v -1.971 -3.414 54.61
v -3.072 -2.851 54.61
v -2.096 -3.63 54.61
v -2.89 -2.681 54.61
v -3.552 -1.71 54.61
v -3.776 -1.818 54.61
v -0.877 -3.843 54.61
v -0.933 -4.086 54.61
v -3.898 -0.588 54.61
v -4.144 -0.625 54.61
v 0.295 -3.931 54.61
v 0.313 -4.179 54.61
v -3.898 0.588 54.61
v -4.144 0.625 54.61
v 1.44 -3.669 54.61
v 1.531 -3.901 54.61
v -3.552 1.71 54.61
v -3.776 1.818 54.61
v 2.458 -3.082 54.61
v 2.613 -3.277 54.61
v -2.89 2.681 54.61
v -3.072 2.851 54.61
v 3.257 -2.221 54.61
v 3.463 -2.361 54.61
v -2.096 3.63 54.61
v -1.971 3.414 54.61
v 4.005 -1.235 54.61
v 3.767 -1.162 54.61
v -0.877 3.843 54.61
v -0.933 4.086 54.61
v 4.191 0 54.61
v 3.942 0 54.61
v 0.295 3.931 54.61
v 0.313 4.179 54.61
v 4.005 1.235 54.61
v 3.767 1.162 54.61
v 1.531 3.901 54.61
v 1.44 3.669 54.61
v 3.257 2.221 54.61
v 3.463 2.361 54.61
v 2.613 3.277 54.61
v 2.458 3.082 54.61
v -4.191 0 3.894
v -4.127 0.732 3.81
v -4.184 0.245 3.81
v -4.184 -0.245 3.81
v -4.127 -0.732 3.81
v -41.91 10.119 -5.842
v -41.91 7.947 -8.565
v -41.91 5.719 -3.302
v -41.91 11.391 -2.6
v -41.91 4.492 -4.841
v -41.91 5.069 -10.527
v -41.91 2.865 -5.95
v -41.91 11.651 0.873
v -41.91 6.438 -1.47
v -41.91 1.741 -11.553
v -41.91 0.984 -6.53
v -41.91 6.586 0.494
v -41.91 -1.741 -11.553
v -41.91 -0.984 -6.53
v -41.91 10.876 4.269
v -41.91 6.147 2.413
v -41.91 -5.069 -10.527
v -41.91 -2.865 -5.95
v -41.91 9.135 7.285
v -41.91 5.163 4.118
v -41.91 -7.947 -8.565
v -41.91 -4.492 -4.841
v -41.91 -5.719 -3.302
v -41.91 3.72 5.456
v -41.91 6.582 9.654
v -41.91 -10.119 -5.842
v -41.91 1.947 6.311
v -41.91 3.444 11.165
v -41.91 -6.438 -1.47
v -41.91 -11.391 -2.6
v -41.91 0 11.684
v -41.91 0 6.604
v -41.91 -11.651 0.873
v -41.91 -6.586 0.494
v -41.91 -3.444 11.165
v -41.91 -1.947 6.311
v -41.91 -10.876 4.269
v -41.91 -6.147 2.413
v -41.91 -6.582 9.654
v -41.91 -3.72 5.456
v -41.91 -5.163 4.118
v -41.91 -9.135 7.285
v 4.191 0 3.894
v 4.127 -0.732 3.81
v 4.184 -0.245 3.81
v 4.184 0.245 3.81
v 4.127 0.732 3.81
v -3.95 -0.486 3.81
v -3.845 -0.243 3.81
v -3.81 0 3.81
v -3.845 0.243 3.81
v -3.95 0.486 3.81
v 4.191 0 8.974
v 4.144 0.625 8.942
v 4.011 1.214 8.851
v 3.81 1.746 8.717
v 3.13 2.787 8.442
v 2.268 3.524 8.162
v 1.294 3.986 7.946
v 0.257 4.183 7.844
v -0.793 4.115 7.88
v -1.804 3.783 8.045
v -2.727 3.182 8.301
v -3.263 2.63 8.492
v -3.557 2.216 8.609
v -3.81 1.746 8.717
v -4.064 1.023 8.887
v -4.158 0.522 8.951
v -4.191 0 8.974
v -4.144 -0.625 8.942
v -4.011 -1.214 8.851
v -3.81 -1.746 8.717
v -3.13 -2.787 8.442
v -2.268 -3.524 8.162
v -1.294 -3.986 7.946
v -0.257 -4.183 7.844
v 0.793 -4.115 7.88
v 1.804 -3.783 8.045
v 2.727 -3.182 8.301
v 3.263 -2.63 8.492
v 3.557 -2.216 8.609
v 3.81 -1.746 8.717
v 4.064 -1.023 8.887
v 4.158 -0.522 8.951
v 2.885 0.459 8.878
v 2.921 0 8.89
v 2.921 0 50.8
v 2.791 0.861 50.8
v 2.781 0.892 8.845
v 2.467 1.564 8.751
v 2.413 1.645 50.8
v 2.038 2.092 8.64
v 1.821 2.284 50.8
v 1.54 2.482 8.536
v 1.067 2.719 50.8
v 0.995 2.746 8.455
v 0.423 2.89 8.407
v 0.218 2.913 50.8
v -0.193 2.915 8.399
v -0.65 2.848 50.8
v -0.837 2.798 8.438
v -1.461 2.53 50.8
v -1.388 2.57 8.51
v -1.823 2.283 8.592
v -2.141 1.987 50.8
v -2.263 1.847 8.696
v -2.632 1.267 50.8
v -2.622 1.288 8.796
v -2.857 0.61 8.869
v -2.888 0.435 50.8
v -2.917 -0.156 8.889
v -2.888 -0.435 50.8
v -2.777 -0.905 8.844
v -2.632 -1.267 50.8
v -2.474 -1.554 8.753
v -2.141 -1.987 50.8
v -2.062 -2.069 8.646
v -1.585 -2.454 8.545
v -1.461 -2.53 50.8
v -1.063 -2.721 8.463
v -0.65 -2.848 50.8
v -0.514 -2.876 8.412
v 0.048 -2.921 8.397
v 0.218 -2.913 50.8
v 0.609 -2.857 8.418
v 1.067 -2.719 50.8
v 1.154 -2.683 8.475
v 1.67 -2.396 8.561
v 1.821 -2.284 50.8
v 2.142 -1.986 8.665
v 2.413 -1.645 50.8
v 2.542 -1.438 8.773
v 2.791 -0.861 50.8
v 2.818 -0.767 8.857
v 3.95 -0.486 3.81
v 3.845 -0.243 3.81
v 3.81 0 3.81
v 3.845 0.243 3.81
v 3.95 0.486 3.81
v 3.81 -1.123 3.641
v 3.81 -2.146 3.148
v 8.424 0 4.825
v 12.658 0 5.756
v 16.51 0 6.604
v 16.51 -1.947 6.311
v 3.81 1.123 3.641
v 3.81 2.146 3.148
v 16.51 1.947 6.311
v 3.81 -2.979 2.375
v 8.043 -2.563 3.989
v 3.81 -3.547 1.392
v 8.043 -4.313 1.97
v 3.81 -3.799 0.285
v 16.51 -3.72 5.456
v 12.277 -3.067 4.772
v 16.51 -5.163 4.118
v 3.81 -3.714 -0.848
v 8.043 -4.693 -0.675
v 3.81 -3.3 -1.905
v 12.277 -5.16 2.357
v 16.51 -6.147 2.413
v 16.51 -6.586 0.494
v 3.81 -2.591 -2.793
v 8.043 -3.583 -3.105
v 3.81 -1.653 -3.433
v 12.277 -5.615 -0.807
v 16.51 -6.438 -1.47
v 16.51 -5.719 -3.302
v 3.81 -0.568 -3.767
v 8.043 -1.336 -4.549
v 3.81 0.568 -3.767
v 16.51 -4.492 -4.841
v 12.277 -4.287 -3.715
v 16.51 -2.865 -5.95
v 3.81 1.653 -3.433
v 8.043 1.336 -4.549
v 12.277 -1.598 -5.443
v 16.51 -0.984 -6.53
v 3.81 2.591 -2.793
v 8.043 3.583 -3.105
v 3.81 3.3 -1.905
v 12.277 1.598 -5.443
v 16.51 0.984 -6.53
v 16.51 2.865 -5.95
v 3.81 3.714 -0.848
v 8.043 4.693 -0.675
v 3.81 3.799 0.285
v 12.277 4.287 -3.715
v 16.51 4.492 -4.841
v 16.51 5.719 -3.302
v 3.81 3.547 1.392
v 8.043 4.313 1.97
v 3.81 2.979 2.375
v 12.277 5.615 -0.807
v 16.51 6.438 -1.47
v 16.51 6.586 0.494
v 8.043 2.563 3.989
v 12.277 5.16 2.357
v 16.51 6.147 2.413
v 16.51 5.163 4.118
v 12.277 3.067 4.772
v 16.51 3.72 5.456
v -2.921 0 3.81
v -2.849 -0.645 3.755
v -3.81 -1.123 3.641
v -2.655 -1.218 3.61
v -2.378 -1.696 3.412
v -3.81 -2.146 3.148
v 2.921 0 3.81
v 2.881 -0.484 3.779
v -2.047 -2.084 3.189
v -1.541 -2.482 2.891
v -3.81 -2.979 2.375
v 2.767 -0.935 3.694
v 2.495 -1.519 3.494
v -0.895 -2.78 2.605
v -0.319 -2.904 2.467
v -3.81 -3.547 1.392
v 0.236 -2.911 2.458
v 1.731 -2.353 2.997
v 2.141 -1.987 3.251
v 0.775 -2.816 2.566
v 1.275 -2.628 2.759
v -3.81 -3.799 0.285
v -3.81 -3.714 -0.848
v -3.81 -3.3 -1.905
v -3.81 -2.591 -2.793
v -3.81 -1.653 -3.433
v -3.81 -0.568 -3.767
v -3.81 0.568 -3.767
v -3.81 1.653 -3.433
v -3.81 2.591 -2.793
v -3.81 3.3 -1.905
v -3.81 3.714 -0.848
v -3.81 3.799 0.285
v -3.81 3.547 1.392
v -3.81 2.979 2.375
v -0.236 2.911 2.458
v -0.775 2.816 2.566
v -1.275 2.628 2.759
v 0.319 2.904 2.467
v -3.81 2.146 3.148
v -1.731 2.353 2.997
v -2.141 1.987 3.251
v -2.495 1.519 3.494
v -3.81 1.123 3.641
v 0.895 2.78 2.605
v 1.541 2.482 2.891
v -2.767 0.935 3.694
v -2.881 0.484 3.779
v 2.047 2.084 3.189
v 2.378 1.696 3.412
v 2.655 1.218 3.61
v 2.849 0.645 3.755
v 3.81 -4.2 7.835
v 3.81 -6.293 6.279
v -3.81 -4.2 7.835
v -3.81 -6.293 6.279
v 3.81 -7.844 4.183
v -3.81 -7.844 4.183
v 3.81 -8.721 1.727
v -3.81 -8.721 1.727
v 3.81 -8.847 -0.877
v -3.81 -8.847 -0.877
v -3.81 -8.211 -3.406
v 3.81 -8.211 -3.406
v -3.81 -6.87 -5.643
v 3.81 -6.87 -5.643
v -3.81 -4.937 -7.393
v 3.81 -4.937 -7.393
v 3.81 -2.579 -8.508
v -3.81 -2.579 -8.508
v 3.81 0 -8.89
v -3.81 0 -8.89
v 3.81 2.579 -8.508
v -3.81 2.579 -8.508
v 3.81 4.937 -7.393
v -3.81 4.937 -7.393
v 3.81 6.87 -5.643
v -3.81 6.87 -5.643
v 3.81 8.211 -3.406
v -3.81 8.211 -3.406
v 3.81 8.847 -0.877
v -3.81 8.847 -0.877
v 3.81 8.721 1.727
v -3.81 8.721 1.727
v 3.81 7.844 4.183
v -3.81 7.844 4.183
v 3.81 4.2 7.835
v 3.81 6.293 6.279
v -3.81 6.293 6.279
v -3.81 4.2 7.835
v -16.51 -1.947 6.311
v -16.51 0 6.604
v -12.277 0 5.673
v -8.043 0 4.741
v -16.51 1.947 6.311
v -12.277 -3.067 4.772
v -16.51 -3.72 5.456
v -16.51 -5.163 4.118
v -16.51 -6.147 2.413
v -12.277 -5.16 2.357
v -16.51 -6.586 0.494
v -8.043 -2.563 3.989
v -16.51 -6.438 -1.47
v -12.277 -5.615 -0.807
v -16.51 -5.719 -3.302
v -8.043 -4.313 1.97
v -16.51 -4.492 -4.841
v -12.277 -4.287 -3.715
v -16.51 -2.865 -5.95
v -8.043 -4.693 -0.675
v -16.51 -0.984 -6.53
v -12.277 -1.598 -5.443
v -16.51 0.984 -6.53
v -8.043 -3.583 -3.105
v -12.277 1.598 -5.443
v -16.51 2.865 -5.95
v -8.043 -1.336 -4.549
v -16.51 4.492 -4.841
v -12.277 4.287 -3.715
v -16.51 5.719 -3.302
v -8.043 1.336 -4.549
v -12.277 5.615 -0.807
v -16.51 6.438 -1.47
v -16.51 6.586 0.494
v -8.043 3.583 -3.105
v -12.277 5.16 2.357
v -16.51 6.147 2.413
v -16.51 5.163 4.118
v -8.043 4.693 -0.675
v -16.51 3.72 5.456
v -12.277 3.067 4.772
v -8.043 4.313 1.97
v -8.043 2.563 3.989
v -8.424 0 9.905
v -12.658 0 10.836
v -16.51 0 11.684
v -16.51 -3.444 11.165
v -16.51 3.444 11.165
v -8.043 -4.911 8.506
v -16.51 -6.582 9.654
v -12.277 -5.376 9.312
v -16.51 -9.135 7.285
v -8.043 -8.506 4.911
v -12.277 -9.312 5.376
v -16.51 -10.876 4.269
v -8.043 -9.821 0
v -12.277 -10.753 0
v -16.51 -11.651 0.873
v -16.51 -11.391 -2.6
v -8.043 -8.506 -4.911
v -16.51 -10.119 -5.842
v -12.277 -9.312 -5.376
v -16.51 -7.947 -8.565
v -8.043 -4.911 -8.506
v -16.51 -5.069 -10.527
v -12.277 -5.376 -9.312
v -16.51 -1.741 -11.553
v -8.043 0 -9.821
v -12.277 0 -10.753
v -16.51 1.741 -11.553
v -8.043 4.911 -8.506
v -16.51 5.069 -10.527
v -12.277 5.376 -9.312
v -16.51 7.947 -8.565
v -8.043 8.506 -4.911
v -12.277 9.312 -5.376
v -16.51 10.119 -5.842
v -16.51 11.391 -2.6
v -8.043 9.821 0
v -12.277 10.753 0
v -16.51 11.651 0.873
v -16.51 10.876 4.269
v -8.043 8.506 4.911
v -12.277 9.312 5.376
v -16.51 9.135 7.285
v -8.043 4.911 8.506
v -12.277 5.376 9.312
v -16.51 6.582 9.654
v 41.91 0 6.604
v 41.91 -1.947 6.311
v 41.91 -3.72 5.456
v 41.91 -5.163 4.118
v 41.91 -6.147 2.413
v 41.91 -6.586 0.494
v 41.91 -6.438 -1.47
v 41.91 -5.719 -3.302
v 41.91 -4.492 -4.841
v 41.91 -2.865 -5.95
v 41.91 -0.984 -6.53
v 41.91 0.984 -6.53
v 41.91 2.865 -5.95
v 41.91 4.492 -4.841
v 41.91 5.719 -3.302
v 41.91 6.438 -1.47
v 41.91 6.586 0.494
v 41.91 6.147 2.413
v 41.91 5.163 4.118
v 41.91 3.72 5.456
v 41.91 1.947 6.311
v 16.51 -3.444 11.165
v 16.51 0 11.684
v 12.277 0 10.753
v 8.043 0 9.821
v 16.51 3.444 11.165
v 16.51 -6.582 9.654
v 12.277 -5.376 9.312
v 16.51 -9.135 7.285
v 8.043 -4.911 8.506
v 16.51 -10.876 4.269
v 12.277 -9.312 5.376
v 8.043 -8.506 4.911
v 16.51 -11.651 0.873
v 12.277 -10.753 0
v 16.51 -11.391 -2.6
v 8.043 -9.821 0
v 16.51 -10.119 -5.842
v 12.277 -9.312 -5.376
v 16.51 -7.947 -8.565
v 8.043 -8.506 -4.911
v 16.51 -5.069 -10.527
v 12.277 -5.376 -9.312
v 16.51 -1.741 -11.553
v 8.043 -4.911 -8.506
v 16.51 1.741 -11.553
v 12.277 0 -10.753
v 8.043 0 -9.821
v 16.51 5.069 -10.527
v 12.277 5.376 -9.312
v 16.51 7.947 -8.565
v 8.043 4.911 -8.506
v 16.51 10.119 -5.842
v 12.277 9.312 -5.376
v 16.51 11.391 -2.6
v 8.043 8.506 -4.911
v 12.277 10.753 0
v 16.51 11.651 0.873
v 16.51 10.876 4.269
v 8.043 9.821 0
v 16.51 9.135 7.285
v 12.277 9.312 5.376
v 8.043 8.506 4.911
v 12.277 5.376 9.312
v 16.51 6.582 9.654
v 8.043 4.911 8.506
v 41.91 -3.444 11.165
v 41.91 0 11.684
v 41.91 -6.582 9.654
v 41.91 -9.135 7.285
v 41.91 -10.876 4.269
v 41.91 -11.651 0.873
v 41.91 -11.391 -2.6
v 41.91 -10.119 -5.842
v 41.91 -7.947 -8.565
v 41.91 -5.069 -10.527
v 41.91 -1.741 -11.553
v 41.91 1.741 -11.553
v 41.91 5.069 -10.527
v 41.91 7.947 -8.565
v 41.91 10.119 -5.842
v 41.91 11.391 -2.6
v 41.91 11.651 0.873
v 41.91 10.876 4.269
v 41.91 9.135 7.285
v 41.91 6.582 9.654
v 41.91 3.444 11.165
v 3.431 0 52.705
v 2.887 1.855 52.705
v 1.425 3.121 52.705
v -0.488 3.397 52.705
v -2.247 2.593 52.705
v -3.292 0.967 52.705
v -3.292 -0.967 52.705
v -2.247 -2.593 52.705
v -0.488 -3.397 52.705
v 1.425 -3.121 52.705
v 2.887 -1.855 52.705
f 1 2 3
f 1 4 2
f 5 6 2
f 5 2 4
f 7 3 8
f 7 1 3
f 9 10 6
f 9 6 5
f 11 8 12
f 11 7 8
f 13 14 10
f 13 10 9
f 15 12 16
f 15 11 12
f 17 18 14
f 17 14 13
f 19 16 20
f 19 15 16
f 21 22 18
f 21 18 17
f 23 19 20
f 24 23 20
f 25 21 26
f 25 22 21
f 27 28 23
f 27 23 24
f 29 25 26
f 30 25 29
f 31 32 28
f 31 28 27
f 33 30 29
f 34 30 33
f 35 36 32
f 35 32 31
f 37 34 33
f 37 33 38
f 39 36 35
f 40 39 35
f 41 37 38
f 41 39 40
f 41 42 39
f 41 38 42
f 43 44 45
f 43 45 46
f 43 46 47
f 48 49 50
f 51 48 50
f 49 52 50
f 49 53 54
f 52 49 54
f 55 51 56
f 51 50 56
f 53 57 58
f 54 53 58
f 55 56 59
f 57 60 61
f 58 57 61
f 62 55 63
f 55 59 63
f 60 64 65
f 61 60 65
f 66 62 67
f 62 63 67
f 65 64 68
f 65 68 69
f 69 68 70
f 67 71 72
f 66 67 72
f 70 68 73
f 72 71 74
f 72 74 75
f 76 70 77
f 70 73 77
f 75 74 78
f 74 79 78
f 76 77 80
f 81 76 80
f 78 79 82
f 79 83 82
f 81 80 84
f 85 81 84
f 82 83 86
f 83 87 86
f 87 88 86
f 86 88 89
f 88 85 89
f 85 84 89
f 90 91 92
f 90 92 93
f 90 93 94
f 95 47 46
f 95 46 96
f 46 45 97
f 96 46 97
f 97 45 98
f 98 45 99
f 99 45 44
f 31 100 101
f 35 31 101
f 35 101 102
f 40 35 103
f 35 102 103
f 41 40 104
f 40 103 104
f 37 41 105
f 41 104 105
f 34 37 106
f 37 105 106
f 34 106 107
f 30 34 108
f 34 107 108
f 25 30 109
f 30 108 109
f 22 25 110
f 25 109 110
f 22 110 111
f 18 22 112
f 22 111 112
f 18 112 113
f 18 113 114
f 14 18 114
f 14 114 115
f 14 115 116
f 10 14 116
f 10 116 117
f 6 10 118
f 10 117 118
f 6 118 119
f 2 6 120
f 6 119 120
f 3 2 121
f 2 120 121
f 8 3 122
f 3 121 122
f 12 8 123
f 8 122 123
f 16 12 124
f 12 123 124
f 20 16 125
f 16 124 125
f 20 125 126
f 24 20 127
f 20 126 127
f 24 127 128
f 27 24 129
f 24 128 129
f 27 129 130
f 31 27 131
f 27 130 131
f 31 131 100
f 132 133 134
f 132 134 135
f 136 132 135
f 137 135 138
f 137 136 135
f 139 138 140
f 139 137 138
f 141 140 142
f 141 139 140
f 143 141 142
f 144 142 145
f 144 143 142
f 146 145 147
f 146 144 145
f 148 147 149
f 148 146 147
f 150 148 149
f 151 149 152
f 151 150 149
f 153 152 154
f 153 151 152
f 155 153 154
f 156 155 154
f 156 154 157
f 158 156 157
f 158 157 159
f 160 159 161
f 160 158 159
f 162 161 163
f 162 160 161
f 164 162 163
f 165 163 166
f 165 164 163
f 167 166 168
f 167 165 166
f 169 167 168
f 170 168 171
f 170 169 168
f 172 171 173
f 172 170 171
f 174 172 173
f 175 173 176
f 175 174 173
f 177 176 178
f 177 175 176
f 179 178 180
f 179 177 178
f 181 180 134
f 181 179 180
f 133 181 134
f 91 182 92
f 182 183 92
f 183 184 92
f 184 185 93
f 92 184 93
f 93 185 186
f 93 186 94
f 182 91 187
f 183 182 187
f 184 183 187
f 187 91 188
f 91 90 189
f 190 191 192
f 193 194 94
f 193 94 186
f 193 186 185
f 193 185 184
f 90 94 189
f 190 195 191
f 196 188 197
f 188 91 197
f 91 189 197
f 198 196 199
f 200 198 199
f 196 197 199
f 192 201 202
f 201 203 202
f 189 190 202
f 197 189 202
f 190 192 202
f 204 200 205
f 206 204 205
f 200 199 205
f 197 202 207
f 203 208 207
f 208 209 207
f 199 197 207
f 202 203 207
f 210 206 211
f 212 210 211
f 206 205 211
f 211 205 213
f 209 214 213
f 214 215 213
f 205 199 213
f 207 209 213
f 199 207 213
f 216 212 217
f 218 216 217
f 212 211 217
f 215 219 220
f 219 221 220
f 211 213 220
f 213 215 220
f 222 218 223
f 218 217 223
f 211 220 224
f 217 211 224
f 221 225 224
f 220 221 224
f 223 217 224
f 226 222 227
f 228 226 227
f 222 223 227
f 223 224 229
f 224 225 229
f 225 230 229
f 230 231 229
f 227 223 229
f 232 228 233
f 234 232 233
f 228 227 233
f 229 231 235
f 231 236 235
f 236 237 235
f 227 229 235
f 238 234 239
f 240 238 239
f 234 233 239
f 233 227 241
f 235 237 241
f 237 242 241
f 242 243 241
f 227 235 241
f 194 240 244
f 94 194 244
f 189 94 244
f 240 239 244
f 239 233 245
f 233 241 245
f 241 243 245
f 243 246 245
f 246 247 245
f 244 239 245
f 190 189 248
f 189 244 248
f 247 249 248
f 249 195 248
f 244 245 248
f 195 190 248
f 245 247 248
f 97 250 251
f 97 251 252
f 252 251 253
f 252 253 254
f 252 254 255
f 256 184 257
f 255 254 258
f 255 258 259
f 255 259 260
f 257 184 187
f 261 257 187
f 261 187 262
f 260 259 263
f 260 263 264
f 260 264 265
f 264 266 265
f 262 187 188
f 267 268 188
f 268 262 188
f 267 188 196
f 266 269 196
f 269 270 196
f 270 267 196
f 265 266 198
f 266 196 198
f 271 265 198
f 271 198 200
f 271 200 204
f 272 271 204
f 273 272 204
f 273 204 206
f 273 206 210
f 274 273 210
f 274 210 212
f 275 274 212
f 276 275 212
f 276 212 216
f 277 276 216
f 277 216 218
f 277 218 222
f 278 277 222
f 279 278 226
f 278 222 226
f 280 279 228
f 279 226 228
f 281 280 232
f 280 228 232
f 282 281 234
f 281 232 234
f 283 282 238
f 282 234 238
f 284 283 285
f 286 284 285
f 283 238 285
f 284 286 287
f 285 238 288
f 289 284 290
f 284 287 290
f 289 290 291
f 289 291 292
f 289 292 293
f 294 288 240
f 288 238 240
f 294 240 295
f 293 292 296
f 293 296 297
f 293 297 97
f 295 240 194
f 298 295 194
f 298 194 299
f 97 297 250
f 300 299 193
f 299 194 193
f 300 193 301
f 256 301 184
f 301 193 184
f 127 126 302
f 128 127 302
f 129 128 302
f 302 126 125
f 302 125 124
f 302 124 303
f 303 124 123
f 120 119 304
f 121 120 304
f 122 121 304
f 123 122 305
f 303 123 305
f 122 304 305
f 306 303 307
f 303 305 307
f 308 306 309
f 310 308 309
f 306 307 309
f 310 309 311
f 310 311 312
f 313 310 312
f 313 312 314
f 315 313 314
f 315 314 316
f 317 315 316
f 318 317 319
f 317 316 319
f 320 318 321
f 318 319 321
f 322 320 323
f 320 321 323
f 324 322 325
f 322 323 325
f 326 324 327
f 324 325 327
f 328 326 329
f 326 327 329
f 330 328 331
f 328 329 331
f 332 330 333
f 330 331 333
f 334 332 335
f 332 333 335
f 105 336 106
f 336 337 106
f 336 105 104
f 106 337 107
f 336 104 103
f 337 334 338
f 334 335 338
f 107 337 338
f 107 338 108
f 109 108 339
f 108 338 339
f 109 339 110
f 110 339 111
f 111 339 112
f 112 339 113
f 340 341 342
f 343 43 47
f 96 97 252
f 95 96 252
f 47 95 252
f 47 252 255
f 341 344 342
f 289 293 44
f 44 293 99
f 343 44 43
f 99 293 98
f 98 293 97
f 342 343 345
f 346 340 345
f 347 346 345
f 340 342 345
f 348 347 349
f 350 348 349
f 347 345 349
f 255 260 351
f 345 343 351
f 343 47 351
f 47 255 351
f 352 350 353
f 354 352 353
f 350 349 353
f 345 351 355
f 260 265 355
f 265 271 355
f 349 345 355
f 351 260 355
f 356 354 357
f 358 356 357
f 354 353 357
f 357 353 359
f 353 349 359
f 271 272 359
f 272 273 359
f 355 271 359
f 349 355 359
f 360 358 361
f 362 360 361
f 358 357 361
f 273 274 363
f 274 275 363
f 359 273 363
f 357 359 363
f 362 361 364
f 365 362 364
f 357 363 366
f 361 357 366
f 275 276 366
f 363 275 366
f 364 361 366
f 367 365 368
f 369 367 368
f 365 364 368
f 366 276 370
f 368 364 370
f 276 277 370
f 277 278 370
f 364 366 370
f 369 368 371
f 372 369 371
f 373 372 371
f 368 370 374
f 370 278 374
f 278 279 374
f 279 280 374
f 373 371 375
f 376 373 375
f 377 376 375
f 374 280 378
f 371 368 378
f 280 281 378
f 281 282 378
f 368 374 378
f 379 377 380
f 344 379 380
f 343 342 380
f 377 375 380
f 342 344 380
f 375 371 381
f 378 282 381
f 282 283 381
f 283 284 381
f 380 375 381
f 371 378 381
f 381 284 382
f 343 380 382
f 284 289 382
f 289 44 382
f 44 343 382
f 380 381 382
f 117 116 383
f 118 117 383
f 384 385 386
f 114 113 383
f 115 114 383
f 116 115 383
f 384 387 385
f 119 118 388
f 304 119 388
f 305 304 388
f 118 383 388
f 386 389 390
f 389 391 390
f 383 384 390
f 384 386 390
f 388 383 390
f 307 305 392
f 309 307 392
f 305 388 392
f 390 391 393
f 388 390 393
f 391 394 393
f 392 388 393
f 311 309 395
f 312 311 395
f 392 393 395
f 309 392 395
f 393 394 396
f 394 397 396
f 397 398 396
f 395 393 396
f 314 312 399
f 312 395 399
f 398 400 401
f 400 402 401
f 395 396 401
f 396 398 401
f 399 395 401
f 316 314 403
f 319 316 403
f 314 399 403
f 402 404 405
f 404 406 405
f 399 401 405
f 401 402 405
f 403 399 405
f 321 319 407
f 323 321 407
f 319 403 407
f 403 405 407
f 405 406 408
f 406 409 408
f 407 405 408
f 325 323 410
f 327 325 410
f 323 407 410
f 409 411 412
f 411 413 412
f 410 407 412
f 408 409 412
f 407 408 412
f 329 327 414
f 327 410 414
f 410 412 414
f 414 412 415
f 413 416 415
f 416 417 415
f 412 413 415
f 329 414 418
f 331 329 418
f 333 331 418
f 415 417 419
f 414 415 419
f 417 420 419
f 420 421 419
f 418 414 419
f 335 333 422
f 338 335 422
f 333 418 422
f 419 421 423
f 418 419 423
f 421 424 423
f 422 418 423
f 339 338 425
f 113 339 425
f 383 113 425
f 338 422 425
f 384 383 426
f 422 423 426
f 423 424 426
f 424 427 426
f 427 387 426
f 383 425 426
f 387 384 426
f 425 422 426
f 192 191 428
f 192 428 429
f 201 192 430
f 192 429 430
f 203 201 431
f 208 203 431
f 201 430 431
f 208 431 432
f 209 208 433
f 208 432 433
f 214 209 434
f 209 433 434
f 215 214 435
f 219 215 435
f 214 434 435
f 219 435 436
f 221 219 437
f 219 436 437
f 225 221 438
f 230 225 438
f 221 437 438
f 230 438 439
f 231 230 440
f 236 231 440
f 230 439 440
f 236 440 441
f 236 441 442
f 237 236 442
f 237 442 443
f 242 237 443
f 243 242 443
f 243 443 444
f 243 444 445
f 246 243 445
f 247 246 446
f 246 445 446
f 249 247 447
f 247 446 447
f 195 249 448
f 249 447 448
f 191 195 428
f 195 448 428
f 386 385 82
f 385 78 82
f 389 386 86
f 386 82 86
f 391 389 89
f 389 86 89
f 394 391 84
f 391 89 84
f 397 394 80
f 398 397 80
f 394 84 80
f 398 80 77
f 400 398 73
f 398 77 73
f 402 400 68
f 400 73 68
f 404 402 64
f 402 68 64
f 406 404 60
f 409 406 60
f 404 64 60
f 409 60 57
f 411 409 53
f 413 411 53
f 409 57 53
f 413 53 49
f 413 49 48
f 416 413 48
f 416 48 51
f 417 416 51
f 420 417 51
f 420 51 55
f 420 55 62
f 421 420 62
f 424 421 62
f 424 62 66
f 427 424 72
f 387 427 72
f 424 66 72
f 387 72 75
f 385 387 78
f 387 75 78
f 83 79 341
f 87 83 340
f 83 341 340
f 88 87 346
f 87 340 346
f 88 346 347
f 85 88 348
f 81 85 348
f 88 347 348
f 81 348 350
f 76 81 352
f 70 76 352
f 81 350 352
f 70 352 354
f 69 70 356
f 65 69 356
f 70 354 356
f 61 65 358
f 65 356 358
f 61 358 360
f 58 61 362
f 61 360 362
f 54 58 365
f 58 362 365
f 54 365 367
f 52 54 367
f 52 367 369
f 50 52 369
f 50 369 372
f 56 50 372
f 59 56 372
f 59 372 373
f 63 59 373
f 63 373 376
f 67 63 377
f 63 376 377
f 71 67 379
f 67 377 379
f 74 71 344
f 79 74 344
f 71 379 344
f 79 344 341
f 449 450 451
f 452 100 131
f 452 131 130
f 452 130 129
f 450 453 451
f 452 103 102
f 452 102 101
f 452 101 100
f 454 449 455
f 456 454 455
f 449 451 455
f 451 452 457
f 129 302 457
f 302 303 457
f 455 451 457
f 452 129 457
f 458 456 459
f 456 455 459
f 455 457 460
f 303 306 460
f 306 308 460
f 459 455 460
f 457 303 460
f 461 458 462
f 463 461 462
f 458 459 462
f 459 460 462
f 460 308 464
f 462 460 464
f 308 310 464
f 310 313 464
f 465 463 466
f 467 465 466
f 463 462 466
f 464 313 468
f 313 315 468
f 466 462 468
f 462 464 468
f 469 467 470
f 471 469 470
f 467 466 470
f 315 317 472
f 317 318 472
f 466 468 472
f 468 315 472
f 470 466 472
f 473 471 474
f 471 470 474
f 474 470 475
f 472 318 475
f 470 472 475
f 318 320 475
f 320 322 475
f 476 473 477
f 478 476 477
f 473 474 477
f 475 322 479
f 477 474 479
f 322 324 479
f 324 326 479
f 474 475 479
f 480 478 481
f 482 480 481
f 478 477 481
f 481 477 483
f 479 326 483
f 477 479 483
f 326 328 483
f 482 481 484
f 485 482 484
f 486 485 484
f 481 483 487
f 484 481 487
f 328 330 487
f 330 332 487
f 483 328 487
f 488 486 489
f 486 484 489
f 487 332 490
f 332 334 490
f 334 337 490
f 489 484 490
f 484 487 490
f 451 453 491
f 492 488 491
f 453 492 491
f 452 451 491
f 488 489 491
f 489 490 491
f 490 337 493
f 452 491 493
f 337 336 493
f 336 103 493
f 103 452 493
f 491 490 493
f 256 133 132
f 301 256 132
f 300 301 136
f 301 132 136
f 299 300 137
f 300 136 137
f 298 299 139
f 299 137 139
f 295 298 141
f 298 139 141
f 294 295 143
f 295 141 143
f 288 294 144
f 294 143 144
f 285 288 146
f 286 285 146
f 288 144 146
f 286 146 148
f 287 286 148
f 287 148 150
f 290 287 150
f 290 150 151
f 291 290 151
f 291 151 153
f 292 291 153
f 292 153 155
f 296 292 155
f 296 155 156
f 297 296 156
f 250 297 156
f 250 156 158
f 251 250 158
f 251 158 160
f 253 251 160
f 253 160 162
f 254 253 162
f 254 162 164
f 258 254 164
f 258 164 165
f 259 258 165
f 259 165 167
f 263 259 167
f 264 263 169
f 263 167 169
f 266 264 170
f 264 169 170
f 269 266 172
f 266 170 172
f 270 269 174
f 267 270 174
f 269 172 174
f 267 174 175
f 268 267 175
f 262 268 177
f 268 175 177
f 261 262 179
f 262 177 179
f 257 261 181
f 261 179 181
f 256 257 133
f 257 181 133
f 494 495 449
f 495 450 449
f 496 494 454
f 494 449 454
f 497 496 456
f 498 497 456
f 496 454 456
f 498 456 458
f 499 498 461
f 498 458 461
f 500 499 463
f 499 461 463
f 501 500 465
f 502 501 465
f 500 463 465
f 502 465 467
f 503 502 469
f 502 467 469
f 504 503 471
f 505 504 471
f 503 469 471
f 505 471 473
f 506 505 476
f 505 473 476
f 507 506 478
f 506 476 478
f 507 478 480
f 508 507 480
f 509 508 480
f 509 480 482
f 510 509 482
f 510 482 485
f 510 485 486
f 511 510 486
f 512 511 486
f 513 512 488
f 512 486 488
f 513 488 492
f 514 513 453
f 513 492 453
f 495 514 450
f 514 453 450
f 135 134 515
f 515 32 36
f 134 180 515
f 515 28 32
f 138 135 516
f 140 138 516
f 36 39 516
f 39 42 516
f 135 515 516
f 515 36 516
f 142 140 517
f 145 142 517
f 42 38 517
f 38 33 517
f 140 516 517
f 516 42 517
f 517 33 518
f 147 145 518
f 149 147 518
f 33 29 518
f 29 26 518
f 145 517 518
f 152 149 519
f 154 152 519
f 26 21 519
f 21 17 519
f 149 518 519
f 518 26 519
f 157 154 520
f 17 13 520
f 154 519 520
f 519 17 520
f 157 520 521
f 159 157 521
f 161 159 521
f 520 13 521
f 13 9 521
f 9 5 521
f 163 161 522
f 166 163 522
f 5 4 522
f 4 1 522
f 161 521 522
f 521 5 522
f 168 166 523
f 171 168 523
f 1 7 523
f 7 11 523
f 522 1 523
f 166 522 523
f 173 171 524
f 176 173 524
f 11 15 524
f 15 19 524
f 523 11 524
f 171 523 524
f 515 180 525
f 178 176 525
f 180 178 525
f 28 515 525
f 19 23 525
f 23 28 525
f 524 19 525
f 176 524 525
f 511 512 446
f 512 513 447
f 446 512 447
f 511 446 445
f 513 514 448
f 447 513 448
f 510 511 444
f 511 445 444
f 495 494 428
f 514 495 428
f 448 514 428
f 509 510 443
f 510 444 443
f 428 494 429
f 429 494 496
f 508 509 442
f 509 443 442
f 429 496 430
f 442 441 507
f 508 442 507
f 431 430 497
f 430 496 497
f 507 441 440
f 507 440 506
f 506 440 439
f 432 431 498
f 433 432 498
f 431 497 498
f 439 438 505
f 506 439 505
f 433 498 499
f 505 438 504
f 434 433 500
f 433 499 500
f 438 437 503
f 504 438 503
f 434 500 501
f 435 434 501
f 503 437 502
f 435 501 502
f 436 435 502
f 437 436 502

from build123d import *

# Parameters (mm, degrees)
F3_R     = 4.191
F3_R_2   = 2.921
F4_DEPTH = 50.8
F5_SIZE2 = 1.0208864232
F5_SIZE  = 3.81
F6_R     = 2.921
F7_DEPTH = 53.34


with BuildPart() as f1:
    # F0 (on Front) → F1 (revolve)
    with BuildSketch(Plane.XZ):
        Polygon((-3.81, 3.81), (0, 3.81), (3.81, 3.81), (16.51, 6.604), (41.91, 6.604), (41.91, 11.684), (16.51, 11.684), (3.81, 8.89), (0, 8.89), (-3.81, 8.89), (-16.51, 11.684), (-41.91, 11.684), (-41.91, 6.604), (-16.51, 6.604), align=None)
    revolve(axis=Axis((2.9206331819, 0, 0), (1, 0, 0)))

    # F3 (on offset) → F4 (join)
    with BuildSketch(Plane.XY.offset(3.81)):
        Circle(F3_R)
        Circle(F3_R_2, mode=Mode.SUBTRACT)
    extrude(amount=F4_DEPTH)

    # F5
    f5_edges = [f1.edges().sort_by_distance(p)[0] for p in [
        (-2.921, 0, 54.61),
    ]]
    f5_side = f1.faces().sort_by_distance((-2.921, 0, 31.503029))[0]
    chamfer(f5_edges, length=F5_SIZE, length2=F5_SIZE2, reference=f5_side)

    # F6 (on face) → F7 (cut)
    with BuildSketch(Plane.XY.offset(54.61)):
        Circle(F6_R)
    extrude(amount=-F7_DEPTH, mode=Mode.SUBTRACT)


solid = f1.part
